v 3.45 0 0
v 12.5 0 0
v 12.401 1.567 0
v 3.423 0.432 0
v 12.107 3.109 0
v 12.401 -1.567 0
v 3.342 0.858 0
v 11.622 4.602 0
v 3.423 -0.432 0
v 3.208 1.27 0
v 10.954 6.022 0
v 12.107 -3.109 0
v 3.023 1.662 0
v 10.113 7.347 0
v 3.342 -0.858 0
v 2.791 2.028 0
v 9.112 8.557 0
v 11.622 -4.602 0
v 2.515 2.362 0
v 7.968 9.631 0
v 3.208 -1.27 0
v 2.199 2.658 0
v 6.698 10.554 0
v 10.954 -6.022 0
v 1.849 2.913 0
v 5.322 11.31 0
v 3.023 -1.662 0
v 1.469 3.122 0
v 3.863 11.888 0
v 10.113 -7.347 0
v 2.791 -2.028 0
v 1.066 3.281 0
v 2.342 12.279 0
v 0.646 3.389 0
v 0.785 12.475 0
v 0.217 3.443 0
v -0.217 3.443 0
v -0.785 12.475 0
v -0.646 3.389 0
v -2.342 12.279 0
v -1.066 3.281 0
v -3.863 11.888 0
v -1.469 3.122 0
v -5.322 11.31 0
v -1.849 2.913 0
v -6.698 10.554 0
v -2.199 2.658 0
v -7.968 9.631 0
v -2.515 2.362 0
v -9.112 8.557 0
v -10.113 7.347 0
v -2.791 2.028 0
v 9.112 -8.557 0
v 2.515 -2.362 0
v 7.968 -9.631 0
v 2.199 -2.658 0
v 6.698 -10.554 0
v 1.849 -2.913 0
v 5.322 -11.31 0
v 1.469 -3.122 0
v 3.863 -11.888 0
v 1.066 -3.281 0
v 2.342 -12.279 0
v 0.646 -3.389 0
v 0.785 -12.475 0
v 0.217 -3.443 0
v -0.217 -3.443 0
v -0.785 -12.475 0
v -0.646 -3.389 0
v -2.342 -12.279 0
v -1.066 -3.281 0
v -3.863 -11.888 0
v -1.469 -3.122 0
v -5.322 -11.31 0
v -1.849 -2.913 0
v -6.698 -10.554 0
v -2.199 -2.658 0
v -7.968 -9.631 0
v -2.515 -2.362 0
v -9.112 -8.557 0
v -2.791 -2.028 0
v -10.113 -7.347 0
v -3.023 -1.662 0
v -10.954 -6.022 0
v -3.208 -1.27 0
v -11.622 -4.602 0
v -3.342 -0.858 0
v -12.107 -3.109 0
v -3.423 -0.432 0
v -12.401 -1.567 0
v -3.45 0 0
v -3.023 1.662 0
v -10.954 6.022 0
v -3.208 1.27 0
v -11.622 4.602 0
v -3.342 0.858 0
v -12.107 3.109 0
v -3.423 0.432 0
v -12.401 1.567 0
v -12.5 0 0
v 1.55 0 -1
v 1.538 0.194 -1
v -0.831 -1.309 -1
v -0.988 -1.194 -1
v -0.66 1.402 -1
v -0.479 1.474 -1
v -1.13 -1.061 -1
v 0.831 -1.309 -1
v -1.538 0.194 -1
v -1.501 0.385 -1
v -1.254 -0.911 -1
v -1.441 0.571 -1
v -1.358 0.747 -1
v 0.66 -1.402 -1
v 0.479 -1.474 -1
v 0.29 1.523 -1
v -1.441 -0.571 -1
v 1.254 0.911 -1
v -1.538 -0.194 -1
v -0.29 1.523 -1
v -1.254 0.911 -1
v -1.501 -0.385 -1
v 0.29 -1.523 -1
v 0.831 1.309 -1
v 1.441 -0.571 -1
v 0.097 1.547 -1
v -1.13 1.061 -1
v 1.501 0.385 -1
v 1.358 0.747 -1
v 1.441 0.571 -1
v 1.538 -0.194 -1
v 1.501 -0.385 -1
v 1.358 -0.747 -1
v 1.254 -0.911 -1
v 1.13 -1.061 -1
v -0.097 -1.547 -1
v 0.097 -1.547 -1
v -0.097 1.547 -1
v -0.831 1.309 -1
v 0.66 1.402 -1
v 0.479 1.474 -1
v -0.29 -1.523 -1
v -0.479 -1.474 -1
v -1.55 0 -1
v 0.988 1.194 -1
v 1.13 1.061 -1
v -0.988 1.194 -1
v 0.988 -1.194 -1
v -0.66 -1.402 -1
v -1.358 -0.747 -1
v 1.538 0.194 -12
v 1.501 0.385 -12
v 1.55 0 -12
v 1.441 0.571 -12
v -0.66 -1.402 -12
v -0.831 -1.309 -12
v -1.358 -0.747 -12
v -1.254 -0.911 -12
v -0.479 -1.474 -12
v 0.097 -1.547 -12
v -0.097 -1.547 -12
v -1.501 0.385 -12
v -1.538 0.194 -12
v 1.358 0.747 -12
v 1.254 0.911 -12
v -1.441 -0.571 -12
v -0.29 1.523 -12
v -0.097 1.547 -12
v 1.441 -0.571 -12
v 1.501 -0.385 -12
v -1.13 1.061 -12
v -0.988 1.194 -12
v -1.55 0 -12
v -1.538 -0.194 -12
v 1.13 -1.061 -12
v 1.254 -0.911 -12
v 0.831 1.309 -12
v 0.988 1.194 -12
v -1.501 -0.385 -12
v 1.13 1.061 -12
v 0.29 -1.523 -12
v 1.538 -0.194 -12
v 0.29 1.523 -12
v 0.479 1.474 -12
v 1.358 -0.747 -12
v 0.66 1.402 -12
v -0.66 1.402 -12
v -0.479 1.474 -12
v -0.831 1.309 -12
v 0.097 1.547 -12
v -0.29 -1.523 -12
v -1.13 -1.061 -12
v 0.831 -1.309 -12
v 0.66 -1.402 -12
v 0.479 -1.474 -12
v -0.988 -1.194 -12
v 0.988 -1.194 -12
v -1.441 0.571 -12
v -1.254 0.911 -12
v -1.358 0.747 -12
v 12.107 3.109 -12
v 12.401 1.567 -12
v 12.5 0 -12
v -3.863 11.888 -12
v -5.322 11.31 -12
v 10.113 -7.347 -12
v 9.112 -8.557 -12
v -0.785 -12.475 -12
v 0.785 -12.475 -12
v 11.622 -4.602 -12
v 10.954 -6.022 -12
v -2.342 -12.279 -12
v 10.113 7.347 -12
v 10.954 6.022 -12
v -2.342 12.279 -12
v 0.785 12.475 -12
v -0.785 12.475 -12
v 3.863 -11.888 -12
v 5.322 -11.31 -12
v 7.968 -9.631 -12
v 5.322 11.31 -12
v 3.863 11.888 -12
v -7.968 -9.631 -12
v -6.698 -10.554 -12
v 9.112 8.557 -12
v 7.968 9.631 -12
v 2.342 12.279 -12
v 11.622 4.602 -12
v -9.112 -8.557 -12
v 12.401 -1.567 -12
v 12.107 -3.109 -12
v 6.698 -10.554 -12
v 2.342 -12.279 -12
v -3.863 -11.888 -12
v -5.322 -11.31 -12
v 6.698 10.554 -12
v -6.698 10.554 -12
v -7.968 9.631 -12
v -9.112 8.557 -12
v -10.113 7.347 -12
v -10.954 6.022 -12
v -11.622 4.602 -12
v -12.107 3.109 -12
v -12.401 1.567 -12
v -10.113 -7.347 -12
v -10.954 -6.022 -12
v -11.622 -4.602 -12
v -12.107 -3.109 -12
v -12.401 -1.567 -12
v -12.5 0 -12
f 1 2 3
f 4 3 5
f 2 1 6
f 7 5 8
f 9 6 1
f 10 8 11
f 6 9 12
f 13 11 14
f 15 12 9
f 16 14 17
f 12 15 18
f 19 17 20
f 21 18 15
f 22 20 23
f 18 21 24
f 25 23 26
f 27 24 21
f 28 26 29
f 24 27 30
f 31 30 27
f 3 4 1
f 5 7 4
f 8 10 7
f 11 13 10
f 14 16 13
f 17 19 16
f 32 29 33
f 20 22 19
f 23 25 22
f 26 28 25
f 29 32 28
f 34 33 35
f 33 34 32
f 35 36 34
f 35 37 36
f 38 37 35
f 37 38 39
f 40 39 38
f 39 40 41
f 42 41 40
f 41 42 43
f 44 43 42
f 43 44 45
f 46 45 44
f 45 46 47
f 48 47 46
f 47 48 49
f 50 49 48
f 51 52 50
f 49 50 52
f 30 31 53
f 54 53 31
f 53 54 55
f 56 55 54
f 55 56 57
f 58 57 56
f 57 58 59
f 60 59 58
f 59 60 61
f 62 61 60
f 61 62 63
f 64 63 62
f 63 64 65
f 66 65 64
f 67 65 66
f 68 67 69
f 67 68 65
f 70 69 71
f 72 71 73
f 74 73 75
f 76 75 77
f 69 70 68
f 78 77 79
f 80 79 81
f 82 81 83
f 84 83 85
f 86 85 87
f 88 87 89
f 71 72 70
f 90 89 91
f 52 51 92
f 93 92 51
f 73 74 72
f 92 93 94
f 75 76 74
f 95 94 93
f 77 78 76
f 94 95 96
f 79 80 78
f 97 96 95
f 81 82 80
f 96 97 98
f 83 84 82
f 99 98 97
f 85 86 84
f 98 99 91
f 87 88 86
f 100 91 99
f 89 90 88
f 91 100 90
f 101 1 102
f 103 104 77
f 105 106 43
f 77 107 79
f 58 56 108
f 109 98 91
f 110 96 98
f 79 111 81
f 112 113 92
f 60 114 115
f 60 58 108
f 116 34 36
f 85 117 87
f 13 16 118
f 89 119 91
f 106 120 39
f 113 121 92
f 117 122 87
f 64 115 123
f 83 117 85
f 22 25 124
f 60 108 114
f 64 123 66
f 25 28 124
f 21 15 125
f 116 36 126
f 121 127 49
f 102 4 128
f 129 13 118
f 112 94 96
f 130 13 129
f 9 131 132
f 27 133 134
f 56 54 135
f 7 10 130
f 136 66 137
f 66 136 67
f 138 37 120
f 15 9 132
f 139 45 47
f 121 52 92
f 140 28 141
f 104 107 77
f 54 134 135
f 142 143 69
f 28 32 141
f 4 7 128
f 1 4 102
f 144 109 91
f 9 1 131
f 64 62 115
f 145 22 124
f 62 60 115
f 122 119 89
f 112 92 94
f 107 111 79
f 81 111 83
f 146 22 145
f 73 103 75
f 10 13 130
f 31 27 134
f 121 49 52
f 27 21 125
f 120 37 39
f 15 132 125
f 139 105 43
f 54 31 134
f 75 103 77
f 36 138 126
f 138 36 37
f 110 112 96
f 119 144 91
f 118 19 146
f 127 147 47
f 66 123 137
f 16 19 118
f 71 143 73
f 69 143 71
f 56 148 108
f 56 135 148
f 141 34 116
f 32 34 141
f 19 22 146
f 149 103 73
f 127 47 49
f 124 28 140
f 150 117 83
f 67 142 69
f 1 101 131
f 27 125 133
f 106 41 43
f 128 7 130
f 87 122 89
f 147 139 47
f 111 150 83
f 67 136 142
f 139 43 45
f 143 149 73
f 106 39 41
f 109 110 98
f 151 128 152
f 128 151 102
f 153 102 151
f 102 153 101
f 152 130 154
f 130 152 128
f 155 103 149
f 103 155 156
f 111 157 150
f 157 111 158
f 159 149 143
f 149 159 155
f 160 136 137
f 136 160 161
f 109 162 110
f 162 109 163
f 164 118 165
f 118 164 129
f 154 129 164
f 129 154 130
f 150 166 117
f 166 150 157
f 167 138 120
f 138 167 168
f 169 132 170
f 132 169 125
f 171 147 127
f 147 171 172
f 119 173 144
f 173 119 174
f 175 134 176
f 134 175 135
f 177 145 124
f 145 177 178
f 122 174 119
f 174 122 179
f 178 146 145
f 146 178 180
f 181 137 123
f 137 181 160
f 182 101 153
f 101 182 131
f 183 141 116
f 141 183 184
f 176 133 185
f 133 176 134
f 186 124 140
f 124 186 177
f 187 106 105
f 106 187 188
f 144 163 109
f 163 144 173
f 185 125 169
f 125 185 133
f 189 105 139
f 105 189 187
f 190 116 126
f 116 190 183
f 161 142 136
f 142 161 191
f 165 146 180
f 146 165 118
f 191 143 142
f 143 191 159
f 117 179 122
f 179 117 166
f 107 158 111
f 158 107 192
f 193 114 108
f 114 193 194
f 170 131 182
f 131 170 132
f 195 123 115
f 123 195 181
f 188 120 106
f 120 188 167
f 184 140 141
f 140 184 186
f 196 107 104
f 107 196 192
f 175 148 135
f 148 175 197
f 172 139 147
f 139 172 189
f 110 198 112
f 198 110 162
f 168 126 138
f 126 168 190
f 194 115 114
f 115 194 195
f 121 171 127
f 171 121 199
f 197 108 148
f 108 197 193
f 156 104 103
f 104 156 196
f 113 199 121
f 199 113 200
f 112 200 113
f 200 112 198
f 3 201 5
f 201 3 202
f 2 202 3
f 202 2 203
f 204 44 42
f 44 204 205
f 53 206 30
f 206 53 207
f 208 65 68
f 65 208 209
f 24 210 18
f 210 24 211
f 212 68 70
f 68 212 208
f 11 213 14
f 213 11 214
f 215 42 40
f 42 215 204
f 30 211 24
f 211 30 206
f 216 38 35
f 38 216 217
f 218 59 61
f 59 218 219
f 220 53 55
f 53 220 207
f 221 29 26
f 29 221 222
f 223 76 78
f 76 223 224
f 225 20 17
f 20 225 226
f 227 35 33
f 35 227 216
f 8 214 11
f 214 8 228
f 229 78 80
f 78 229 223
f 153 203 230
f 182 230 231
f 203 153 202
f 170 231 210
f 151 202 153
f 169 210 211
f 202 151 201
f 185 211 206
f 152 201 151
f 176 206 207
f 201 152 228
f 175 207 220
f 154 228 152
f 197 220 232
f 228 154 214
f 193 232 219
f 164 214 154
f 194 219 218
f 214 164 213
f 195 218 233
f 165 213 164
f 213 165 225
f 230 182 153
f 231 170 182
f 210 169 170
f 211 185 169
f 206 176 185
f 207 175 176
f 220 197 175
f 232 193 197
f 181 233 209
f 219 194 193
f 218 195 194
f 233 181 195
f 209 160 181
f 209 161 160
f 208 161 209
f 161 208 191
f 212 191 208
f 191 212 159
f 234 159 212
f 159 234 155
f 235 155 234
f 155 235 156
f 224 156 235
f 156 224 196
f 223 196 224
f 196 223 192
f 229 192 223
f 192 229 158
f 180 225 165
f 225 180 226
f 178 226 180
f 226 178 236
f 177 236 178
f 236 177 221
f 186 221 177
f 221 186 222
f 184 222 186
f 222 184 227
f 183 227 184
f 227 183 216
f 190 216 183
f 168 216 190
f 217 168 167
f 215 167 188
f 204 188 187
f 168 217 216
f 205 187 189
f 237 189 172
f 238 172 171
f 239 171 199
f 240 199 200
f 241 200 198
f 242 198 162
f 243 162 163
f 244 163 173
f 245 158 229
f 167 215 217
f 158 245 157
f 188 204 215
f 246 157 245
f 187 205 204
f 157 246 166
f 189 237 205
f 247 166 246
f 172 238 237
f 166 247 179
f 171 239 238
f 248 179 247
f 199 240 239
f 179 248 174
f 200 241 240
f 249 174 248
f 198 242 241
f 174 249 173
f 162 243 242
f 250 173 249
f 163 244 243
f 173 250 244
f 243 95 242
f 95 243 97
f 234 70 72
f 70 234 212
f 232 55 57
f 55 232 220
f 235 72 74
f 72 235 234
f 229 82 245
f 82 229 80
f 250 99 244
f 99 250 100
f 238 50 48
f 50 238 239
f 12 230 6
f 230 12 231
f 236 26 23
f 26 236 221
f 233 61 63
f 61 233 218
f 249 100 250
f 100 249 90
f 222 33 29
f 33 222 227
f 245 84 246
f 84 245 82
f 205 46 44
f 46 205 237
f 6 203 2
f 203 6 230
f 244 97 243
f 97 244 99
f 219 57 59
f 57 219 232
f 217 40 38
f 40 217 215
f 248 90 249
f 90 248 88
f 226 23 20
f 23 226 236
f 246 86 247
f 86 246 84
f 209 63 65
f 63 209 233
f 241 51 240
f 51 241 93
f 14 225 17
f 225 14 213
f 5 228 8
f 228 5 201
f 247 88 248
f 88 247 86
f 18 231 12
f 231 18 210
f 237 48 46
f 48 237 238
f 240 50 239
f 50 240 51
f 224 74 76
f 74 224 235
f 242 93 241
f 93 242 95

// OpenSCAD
$fn = 50;


difference() {
	union() {
		translate(v = [0, 0, -12.0000000000]) {
			cylinder(h = 12, r = 12.5000000000);
		}
	}
	union() {
		translate(v = [0, 0, 0]) {
			rotate(a = [0, 0, 0]) {
				difference() {
					union() {
						translate(v = [0, 0, -15.0000000000]) {
							cylinder(h = 15, r = 1.2500000000);
						}
						translate(v = [0, 0, -1.0000000000]) {
							cylinder(h = 1.0000000000, r1 = 1.5500000000, r2 = 3.4500000000);
						}
						translate(v = [0, 0, -15.0000000000]) {
							cylinder(h = 15, r = 1.5500000000);
						}
						translate(v = [0, 0, -15.0000000000]) {
							cylinder(h = 15, r = 1.2500000000);
						}
					}
					union();
				}
			}
		}
	}
}
